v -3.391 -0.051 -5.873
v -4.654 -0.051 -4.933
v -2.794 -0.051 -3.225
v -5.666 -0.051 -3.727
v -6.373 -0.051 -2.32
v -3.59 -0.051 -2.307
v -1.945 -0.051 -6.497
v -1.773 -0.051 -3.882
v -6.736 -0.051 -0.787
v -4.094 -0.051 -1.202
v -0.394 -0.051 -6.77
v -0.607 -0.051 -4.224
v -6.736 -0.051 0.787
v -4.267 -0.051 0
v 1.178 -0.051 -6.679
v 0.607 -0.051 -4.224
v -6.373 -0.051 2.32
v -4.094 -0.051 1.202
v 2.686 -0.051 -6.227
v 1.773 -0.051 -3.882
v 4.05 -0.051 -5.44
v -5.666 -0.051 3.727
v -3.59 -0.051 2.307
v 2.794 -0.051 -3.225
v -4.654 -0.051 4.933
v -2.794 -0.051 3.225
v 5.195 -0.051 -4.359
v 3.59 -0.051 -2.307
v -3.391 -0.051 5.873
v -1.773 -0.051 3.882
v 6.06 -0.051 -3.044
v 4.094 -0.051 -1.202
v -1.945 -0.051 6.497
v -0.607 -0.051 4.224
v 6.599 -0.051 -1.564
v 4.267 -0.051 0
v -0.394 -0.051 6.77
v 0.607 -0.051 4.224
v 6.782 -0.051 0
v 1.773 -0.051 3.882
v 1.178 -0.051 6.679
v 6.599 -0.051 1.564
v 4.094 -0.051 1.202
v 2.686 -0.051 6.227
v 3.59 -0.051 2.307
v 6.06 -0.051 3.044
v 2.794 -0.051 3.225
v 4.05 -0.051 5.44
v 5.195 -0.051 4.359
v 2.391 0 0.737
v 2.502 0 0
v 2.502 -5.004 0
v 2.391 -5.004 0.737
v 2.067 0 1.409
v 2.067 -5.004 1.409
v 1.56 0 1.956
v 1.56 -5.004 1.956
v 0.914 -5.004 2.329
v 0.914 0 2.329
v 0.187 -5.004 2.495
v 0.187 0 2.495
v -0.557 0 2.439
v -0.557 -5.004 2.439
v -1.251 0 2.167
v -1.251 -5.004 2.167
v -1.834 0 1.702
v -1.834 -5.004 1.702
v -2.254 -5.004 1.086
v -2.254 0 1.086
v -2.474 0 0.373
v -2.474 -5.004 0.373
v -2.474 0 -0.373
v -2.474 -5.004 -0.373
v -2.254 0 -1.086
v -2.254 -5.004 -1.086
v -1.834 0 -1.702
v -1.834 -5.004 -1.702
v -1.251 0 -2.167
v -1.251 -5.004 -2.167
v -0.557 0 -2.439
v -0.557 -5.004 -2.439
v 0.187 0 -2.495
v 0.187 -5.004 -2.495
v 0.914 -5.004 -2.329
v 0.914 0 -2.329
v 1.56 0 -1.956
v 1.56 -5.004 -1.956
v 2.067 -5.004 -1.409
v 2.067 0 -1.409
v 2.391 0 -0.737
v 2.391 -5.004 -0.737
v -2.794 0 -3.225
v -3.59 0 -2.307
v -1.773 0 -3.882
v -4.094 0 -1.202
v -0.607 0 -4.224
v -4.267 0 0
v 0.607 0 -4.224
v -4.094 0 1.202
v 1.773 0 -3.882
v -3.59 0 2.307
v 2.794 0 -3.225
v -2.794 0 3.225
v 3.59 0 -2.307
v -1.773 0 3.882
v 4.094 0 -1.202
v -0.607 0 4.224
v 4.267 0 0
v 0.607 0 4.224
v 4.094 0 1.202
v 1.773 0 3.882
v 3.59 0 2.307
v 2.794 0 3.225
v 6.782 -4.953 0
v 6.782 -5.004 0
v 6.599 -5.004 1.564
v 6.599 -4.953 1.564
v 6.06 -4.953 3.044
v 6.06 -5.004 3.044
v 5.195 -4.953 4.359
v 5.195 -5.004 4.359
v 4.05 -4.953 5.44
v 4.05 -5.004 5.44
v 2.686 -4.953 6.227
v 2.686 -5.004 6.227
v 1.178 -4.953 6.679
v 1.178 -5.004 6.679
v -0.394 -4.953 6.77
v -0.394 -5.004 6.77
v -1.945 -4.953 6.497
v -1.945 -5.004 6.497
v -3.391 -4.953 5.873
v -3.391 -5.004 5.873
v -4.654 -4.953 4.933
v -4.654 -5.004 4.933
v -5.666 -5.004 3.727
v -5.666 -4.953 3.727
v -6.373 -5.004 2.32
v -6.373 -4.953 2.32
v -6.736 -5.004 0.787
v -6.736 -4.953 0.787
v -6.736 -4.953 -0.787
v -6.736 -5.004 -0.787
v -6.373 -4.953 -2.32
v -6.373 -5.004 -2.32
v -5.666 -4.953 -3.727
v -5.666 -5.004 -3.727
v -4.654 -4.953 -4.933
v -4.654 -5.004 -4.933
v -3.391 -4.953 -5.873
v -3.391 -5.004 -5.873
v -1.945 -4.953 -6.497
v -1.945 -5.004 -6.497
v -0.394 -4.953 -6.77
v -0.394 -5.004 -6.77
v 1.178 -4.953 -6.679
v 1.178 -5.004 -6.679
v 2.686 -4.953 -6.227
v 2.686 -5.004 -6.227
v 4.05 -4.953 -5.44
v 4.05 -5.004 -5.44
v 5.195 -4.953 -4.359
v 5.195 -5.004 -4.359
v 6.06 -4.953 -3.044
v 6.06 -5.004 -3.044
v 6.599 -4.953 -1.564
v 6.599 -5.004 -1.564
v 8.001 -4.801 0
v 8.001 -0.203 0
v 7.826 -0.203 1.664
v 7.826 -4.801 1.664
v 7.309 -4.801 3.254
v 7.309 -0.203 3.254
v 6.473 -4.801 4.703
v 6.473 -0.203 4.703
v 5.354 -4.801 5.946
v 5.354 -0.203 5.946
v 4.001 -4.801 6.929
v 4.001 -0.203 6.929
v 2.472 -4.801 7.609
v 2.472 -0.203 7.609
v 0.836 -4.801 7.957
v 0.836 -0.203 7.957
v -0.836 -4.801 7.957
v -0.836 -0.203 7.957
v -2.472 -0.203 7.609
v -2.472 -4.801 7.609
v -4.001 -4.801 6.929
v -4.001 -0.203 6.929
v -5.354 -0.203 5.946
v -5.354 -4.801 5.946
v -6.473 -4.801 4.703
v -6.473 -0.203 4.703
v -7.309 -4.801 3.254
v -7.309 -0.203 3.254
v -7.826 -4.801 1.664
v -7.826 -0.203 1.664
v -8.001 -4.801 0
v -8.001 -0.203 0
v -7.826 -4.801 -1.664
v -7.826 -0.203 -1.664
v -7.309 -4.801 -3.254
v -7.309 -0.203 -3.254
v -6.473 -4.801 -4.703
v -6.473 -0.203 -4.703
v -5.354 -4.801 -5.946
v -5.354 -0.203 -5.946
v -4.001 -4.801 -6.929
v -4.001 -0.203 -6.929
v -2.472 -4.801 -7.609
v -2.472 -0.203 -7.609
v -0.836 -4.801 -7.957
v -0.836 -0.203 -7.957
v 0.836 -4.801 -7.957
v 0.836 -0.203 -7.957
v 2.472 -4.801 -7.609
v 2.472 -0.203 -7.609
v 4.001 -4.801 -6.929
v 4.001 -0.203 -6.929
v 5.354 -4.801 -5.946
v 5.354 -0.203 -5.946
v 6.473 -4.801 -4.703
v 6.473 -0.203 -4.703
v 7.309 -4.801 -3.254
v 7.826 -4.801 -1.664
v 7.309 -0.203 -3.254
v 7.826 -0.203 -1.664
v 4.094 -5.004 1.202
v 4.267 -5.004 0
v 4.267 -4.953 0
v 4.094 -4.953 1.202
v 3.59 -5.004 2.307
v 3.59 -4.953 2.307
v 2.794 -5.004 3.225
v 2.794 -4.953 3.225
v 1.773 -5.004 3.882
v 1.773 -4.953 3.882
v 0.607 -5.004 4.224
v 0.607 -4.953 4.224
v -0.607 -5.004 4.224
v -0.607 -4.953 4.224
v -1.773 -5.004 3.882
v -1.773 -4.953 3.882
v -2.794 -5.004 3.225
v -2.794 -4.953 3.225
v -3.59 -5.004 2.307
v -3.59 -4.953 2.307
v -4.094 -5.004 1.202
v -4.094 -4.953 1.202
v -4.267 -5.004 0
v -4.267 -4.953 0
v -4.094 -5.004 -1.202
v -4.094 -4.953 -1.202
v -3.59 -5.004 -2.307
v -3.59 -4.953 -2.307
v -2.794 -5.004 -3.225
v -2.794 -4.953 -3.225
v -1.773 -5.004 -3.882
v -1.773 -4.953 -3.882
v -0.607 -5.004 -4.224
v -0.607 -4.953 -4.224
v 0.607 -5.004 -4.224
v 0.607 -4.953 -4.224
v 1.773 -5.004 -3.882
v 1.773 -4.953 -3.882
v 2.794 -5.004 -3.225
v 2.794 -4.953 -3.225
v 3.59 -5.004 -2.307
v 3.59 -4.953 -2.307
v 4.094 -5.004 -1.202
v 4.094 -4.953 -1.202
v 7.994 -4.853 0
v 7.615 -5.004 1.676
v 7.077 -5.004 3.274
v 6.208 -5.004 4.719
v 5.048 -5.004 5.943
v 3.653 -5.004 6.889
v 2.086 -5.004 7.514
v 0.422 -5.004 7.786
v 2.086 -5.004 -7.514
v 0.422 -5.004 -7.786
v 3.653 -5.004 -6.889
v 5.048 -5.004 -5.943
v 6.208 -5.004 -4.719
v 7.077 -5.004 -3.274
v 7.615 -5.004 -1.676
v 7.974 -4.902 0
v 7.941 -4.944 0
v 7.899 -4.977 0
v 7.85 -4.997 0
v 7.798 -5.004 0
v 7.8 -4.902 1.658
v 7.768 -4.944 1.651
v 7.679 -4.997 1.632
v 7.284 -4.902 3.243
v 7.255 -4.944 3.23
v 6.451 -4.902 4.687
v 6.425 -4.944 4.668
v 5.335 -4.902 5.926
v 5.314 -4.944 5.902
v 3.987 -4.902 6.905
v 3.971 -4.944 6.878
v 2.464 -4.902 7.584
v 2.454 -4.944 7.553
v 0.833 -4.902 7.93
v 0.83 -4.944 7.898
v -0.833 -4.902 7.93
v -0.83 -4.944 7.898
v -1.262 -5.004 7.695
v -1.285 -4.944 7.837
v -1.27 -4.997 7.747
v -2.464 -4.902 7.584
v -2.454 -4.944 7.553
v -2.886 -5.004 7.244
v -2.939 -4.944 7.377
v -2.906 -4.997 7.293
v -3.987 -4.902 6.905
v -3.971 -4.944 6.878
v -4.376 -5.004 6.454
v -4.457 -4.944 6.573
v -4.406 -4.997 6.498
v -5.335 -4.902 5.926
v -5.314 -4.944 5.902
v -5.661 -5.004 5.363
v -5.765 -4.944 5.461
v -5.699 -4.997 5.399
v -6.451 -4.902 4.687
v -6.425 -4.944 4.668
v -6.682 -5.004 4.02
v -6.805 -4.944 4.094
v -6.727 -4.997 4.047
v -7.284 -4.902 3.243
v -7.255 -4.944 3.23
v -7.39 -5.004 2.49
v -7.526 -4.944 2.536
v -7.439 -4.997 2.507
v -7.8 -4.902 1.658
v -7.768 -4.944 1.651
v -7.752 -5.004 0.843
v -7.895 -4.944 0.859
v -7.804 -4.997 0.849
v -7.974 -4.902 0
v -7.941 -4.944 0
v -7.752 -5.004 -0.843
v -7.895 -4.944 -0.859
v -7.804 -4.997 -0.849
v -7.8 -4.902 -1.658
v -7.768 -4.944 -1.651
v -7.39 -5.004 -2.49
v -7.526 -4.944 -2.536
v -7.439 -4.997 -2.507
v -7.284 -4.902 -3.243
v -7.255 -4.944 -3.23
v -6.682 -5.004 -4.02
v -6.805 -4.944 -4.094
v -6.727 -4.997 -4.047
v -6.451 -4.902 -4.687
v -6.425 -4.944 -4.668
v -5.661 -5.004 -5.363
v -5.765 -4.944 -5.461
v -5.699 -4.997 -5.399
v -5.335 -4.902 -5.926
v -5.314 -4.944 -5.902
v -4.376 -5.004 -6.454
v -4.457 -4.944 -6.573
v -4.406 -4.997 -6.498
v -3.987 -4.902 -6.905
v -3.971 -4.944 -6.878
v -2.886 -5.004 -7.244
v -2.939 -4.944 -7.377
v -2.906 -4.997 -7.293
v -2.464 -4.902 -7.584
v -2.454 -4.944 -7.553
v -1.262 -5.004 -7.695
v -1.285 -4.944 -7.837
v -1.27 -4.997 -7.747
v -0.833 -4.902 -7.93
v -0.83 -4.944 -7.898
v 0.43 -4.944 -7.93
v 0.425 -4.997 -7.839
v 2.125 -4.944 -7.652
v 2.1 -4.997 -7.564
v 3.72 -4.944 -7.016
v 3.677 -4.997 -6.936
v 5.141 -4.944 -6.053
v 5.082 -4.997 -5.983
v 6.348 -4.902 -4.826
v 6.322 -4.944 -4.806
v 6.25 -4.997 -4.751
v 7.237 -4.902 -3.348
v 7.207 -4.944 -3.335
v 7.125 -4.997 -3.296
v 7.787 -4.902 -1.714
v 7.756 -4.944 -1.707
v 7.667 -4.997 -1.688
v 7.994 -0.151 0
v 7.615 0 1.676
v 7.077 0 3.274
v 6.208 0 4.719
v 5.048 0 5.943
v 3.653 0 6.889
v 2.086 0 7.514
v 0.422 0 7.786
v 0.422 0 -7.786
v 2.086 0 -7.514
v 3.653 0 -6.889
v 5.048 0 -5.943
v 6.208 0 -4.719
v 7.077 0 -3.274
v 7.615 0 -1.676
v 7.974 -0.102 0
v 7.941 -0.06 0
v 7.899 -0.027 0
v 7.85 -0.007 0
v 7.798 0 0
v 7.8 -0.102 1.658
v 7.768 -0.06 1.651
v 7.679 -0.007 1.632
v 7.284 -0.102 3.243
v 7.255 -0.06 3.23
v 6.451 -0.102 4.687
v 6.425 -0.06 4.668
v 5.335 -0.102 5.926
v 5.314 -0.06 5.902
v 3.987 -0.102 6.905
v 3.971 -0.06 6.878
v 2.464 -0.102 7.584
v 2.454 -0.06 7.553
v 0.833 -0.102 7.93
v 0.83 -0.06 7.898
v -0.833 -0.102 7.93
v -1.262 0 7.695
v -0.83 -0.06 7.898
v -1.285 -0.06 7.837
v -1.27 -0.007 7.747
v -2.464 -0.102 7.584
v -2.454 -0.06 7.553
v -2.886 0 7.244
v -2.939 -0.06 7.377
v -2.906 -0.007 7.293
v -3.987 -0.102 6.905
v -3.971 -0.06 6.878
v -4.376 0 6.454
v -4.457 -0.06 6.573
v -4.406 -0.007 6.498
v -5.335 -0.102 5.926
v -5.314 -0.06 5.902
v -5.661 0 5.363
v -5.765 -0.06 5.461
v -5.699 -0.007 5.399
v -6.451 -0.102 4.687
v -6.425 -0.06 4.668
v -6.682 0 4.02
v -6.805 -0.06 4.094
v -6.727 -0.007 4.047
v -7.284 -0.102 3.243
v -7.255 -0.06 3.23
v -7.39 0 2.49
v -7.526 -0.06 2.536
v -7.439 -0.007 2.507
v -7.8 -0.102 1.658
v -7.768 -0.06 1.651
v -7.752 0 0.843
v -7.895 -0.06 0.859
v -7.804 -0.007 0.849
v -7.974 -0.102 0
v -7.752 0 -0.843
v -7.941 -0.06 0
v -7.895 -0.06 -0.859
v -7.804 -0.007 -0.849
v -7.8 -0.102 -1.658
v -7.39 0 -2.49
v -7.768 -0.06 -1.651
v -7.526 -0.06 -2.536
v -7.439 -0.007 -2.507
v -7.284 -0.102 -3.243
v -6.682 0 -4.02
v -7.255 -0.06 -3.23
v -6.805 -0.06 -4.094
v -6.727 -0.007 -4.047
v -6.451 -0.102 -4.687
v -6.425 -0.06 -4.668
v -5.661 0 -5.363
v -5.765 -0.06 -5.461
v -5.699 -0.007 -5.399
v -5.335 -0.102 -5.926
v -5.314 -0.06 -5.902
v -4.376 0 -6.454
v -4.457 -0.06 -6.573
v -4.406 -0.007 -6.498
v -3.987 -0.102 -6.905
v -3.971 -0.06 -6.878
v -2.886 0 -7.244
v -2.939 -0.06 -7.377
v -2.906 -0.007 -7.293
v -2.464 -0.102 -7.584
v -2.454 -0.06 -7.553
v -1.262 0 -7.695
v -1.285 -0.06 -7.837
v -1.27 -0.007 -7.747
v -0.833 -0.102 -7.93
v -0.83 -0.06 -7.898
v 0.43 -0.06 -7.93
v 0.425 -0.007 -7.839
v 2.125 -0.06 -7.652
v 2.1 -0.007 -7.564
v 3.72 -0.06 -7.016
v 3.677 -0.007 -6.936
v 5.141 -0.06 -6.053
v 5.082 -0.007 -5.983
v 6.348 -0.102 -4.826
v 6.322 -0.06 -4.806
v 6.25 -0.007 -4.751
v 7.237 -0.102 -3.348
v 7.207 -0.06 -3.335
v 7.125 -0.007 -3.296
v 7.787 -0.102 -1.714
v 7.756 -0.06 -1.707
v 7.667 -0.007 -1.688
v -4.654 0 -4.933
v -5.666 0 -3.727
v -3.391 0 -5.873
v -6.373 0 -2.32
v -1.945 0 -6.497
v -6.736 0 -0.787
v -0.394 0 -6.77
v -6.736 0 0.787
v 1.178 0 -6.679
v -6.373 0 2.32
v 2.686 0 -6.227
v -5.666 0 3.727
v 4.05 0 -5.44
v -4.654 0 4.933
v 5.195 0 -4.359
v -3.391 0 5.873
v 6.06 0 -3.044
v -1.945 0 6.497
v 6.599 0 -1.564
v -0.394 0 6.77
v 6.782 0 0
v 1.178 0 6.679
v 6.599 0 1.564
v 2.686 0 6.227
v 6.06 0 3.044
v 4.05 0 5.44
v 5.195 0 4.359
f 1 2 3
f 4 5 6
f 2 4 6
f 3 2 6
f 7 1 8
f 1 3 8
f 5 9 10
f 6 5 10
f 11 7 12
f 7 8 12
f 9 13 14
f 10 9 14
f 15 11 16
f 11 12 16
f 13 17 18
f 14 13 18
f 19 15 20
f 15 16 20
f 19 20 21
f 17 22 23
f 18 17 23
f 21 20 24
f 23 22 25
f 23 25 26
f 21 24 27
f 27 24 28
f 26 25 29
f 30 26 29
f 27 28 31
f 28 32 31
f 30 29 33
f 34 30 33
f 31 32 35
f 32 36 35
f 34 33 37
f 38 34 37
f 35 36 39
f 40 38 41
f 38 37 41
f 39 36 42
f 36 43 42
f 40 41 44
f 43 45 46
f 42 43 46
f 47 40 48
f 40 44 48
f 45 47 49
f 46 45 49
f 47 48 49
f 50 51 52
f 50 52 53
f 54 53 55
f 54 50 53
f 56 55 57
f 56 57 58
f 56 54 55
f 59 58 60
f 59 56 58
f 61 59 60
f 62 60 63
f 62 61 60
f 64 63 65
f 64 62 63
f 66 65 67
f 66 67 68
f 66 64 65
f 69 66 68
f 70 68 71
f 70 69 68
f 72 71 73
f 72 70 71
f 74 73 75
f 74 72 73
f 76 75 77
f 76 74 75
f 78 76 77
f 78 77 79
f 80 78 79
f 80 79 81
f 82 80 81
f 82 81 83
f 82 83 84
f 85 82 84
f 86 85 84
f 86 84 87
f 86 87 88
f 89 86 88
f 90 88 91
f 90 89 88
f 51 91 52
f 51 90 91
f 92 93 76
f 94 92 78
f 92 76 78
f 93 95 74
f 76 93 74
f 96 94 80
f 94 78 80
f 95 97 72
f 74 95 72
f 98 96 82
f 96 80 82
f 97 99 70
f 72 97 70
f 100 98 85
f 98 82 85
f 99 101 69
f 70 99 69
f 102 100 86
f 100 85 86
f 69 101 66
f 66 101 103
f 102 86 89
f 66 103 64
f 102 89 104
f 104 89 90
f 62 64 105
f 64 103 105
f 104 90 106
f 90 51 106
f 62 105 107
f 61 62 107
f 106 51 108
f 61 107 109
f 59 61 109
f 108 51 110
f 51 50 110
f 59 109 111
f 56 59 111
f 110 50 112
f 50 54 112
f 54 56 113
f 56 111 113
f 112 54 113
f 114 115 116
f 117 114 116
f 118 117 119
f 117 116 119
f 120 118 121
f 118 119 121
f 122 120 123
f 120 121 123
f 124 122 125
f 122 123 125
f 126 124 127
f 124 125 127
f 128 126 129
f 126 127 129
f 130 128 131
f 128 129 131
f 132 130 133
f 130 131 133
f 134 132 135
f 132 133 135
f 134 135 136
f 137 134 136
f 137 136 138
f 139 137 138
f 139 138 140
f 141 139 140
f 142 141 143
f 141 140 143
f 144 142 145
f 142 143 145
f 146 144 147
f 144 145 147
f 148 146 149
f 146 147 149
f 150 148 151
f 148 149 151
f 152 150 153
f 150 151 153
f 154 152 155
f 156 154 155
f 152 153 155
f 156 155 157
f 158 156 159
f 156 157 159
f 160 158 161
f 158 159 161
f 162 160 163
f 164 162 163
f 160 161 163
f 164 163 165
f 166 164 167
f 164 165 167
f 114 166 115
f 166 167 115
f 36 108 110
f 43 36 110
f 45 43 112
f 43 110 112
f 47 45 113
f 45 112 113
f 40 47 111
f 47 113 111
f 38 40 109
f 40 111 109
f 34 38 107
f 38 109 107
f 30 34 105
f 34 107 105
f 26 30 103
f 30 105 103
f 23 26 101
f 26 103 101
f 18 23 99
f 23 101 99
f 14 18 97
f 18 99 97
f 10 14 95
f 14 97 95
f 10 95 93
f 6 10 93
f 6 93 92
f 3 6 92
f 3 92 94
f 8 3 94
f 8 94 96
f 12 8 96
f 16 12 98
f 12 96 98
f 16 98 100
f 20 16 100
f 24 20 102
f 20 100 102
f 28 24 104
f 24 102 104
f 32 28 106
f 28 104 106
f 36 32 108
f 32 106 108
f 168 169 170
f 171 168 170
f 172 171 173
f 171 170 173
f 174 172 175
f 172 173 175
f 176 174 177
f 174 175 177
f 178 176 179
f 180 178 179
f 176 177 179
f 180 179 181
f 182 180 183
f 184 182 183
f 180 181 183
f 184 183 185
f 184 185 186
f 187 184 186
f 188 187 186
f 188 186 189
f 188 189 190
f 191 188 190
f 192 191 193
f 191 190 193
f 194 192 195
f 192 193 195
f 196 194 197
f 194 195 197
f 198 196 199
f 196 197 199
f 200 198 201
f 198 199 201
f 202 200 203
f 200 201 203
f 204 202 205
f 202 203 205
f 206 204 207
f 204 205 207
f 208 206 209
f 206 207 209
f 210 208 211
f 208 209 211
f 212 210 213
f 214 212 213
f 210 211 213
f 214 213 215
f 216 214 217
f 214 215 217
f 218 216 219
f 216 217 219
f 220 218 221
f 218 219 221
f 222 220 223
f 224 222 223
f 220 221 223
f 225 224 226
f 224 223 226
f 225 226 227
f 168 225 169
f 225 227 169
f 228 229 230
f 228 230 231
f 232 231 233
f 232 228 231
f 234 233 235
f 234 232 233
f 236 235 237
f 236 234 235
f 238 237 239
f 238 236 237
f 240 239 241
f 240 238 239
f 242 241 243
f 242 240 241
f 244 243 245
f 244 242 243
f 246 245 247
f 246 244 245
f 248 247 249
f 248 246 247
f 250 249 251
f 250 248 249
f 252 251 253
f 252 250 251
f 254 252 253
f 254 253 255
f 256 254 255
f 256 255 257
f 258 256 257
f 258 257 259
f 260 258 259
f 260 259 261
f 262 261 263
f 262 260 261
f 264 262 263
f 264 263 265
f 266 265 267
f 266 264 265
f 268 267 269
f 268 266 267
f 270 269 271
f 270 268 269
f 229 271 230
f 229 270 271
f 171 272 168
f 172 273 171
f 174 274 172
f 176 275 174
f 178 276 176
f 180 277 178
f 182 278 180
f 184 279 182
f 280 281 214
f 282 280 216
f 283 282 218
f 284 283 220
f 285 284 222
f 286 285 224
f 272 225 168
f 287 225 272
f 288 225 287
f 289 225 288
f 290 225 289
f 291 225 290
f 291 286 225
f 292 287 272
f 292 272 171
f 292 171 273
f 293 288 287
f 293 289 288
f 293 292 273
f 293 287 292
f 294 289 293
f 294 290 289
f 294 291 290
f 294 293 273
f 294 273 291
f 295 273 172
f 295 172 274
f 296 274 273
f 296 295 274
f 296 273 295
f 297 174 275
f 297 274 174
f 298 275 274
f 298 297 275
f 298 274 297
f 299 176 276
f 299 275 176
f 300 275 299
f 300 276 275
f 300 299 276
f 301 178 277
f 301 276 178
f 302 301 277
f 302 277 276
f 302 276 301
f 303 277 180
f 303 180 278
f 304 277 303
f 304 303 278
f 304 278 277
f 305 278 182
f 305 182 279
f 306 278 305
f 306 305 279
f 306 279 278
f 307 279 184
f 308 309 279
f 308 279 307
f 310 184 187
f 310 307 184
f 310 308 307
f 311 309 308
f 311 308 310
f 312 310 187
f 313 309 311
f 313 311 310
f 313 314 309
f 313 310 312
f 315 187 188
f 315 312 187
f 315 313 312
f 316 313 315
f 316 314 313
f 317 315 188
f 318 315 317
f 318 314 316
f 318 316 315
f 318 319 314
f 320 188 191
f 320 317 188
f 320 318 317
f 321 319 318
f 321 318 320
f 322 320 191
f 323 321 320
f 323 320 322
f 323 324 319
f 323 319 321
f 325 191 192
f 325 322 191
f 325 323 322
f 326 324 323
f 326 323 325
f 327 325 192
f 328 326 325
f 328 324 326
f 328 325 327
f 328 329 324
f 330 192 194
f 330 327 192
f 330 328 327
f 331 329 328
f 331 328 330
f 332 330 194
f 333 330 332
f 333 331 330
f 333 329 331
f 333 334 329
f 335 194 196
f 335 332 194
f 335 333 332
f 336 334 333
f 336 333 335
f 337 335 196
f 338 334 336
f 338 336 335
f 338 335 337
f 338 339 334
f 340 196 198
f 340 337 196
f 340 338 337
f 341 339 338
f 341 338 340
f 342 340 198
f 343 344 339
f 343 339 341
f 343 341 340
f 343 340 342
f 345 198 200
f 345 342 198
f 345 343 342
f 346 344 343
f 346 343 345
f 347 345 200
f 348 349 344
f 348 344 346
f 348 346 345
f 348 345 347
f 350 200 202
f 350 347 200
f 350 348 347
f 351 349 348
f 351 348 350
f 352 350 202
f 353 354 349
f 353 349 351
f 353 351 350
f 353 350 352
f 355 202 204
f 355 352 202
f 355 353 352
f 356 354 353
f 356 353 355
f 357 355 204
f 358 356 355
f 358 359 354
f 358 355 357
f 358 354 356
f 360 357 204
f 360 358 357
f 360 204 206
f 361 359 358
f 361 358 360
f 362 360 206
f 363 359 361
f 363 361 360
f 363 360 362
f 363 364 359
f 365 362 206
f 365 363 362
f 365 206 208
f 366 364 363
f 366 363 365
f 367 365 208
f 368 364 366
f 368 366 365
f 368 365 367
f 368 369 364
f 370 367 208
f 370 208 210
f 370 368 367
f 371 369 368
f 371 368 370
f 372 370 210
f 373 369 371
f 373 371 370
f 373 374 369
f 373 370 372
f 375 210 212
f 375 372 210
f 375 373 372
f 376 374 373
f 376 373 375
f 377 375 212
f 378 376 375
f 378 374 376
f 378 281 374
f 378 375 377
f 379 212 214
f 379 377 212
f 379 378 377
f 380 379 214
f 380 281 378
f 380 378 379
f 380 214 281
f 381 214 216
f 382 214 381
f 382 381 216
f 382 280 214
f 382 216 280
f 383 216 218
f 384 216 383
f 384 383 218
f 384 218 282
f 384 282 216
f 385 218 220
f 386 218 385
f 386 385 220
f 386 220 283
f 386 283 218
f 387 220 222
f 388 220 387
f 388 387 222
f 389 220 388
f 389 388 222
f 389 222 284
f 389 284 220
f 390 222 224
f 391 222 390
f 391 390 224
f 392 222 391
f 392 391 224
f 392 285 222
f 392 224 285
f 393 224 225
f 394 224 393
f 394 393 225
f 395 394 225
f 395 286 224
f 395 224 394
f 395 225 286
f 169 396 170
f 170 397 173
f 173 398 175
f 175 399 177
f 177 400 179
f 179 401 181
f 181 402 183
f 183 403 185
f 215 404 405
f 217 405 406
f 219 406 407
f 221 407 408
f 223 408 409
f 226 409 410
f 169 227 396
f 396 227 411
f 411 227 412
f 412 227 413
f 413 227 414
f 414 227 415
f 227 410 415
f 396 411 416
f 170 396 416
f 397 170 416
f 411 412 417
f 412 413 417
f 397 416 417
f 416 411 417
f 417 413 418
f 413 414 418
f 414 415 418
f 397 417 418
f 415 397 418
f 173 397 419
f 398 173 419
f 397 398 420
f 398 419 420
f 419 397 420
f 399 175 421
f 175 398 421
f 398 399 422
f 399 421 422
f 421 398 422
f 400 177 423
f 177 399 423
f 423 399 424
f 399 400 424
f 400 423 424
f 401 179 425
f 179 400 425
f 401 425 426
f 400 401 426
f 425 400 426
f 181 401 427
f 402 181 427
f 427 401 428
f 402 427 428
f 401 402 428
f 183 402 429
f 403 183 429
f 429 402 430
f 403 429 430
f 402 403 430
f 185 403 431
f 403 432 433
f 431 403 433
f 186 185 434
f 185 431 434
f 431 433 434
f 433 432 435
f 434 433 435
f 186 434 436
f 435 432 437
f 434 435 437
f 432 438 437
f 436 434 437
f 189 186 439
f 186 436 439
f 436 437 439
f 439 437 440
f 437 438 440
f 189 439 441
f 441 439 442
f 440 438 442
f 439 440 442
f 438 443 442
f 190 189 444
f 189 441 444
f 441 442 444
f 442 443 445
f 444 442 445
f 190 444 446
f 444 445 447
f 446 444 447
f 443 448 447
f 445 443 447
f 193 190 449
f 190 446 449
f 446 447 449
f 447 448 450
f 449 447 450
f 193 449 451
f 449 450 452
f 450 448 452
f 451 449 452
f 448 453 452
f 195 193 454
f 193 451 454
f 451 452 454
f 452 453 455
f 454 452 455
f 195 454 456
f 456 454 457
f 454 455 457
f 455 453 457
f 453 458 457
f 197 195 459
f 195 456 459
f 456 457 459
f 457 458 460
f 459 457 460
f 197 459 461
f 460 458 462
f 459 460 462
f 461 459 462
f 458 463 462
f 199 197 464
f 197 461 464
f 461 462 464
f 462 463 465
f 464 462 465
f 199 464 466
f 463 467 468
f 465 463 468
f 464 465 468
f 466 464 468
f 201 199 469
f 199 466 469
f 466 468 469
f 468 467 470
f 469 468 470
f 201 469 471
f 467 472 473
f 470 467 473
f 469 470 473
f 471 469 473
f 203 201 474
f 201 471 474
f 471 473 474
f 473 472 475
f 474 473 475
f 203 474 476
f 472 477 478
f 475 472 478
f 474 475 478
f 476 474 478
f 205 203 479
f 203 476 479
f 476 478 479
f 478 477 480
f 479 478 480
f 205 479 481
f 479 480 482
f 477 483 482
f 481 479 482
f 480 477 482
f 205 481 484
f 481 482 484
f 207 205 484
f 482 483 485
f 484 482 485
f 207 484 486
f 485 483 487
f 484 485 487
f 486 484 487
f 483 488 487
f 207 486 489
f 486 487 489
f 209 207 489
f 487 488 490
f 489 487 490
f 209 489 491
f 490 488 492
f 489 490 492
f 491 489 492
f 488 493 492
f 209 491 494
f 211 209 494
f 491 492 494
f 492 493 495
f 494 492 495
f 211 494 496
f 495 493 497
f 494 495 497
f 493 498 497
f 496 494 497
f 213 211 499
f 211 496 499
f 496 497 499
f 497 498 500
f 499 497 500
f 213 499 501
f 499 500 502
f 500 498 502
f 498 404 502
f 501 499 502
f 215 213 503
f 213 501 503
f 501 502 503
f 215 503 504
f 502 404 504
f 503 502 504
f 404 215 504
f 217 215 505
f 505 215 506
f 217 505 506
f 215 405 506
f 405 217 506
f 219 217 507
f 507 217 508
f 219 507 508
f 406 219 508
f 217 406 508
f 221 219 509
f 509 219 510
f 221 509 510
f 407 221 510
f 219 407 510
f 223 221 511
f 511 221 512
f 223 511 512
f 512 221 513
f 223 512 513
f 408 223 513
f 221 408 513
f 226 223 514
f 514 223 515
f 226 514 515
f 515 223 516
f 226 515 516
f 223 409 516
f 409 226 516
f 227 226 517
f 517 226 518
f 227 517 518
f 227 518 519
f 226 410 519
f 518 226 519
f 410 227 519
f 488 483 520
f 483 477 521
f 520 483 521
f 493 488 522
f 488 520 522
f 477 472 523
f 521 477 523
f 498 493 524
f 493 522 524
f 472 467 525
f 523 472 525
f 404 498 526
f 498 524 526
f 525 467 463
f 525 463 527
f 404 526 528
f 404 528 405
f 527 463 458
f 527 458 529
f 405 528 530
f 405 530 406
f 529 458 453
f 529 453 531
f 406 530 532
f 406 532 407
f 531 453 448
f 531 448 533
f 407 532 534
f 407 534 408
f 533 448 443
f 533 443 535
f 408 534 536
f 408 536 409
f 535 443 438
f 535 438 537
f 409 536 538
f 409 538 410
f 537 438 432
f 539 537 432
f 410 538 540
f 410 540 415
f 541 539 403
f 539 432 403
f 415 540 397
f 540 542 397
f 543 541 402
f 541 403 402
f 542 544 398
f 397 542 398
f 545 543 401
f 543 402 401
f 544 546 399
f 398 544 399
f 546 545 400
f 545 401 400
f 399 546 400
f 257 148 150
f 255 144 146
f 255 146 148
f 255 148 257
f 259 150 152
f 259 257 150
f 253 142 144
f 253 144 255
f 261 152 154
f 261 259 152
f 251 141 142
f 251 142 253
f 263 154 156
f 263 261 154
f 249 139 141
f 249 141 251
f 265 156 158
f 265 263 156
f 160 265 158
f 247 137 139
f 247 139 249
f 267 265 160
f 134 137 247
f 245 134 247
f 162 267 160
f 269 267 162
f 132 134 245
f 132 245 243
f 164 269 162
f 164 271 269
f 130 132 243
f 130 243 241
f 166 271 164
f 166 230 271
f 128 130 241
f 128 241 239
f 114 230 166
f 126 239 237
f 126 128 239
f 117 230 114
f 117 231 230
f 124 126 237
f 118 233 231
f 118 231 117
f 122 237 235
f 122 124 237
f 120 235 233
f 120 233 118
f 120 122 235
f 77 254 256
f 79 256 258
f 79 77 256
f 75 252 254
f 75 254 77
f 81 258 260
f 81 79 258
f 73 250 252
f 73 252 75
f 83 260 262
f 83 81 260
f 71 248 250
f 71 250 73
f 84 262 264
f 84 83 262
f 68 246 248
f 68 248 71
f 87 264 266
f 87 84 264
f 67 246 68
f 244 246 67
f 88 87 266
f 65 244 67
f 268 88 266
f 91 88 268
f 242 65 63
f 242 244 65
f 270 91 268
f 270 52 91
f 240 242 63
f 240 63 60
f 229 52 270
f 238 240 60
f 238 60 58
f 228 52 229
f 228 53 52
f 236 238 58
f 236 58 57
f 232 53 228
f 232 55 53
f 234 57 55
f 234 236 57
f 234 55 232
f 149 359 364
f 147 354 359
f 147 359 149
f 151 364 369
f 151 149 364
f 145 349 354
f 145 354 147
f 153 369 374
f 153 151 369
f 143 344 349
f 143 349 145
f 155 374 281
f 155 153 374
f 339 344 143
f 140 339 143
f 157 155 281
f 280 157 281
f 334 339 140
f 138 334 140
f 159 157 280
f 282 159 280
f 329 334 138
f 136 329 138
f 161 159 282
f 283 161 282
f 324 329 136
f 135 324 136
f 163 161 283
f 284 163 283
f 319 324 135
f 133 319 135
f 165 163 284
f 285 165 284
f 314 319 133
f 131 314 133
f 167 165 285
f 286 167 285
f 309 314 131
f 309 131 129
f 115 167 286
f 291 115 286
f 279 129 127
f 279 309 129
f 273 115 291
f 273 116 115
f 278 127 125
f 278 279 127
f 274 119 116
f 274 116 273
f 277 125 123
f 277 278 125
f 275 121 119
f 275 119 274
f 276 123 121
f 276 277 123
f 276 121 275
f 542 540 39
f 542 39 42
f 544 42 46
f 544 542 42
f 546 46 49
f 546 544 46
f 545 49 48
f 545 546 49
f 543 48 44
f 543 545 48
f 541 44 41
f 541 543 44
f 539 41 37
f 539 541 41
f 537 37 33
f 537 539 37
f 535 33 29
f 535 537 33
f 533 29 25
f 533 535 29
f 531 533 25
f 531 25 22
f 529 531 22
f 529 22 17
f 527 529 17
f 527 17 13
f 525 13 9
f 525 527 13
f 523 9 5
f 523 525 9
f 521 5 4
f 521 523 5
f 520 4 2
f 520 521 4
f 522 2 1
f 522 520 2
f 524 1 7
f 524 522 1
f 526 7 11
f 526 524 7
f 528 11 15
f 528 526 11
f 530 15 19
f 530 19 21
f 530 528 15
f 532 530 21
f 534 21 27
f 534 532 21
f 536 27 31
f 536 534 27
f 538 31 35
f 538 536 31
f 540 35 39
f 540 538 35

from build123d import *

# Parameters (mm, degrees)
F0_R        = 8.001
F0_R_2      = 2.5019
F1_DEPTH    = 5.0038
F2_R        = 6.7818
F2_R_2      = 4.2672
F1_FACE_R   = 8.001
F1_FACE_R_2 = 2.5019
F3_DEPTH    = 0.0508
F4_R        = 6.7818
F4_R_2      = 4.2672
F5_DEPTH    = 0.0508
F6_R        = 0.2032


with BuildPart() as f1:
    # F0 (on Front) → F1 (new body)
    with BuildSketch(Plane.XZ):
        Circle(F0_R)
        Circle(F0_R_2, mode=Mode.SUBTRACT)
    extrude(amount=F1_DEPTH)

    # F2 (on Front) + F1_face (on face) → F3 (cut)
    with BuildSketch(Plane.XZ):
        Circle(F2_R)
        Circle(F2_R_2, mode=Mode.SUBTRACT)
    with BuildSketch(Plane.XZ.offset(5.0038)):
        Circle(F1_FACE_R)
        Circle(F1_FACE_R_2, mode=Mode.SUBTRACT)
    extrude(amount=F3_DEPTH, mode=Mode.SUBTRACT)

    # F4 (on face) → F5 (cut)
    with BuildSketch(Plane.XZ.offset(5.0038)):
        Circle(F4_R)
        Circle(F4_R_2, mode=Mode.SUBTRACT)
    extrude(amount=-F5_DEPTH, mode=Mode.SUBTRACT)

    # F6
    f6_edges = [f1.edges().sort_by_distance(p)[0] for p in [
        (-8.001, -5.0038, 0),
        (-8.001, 0, 0),
    ]]
    fillet(f6_edges, radius=F6_R)


solid = f1.part
